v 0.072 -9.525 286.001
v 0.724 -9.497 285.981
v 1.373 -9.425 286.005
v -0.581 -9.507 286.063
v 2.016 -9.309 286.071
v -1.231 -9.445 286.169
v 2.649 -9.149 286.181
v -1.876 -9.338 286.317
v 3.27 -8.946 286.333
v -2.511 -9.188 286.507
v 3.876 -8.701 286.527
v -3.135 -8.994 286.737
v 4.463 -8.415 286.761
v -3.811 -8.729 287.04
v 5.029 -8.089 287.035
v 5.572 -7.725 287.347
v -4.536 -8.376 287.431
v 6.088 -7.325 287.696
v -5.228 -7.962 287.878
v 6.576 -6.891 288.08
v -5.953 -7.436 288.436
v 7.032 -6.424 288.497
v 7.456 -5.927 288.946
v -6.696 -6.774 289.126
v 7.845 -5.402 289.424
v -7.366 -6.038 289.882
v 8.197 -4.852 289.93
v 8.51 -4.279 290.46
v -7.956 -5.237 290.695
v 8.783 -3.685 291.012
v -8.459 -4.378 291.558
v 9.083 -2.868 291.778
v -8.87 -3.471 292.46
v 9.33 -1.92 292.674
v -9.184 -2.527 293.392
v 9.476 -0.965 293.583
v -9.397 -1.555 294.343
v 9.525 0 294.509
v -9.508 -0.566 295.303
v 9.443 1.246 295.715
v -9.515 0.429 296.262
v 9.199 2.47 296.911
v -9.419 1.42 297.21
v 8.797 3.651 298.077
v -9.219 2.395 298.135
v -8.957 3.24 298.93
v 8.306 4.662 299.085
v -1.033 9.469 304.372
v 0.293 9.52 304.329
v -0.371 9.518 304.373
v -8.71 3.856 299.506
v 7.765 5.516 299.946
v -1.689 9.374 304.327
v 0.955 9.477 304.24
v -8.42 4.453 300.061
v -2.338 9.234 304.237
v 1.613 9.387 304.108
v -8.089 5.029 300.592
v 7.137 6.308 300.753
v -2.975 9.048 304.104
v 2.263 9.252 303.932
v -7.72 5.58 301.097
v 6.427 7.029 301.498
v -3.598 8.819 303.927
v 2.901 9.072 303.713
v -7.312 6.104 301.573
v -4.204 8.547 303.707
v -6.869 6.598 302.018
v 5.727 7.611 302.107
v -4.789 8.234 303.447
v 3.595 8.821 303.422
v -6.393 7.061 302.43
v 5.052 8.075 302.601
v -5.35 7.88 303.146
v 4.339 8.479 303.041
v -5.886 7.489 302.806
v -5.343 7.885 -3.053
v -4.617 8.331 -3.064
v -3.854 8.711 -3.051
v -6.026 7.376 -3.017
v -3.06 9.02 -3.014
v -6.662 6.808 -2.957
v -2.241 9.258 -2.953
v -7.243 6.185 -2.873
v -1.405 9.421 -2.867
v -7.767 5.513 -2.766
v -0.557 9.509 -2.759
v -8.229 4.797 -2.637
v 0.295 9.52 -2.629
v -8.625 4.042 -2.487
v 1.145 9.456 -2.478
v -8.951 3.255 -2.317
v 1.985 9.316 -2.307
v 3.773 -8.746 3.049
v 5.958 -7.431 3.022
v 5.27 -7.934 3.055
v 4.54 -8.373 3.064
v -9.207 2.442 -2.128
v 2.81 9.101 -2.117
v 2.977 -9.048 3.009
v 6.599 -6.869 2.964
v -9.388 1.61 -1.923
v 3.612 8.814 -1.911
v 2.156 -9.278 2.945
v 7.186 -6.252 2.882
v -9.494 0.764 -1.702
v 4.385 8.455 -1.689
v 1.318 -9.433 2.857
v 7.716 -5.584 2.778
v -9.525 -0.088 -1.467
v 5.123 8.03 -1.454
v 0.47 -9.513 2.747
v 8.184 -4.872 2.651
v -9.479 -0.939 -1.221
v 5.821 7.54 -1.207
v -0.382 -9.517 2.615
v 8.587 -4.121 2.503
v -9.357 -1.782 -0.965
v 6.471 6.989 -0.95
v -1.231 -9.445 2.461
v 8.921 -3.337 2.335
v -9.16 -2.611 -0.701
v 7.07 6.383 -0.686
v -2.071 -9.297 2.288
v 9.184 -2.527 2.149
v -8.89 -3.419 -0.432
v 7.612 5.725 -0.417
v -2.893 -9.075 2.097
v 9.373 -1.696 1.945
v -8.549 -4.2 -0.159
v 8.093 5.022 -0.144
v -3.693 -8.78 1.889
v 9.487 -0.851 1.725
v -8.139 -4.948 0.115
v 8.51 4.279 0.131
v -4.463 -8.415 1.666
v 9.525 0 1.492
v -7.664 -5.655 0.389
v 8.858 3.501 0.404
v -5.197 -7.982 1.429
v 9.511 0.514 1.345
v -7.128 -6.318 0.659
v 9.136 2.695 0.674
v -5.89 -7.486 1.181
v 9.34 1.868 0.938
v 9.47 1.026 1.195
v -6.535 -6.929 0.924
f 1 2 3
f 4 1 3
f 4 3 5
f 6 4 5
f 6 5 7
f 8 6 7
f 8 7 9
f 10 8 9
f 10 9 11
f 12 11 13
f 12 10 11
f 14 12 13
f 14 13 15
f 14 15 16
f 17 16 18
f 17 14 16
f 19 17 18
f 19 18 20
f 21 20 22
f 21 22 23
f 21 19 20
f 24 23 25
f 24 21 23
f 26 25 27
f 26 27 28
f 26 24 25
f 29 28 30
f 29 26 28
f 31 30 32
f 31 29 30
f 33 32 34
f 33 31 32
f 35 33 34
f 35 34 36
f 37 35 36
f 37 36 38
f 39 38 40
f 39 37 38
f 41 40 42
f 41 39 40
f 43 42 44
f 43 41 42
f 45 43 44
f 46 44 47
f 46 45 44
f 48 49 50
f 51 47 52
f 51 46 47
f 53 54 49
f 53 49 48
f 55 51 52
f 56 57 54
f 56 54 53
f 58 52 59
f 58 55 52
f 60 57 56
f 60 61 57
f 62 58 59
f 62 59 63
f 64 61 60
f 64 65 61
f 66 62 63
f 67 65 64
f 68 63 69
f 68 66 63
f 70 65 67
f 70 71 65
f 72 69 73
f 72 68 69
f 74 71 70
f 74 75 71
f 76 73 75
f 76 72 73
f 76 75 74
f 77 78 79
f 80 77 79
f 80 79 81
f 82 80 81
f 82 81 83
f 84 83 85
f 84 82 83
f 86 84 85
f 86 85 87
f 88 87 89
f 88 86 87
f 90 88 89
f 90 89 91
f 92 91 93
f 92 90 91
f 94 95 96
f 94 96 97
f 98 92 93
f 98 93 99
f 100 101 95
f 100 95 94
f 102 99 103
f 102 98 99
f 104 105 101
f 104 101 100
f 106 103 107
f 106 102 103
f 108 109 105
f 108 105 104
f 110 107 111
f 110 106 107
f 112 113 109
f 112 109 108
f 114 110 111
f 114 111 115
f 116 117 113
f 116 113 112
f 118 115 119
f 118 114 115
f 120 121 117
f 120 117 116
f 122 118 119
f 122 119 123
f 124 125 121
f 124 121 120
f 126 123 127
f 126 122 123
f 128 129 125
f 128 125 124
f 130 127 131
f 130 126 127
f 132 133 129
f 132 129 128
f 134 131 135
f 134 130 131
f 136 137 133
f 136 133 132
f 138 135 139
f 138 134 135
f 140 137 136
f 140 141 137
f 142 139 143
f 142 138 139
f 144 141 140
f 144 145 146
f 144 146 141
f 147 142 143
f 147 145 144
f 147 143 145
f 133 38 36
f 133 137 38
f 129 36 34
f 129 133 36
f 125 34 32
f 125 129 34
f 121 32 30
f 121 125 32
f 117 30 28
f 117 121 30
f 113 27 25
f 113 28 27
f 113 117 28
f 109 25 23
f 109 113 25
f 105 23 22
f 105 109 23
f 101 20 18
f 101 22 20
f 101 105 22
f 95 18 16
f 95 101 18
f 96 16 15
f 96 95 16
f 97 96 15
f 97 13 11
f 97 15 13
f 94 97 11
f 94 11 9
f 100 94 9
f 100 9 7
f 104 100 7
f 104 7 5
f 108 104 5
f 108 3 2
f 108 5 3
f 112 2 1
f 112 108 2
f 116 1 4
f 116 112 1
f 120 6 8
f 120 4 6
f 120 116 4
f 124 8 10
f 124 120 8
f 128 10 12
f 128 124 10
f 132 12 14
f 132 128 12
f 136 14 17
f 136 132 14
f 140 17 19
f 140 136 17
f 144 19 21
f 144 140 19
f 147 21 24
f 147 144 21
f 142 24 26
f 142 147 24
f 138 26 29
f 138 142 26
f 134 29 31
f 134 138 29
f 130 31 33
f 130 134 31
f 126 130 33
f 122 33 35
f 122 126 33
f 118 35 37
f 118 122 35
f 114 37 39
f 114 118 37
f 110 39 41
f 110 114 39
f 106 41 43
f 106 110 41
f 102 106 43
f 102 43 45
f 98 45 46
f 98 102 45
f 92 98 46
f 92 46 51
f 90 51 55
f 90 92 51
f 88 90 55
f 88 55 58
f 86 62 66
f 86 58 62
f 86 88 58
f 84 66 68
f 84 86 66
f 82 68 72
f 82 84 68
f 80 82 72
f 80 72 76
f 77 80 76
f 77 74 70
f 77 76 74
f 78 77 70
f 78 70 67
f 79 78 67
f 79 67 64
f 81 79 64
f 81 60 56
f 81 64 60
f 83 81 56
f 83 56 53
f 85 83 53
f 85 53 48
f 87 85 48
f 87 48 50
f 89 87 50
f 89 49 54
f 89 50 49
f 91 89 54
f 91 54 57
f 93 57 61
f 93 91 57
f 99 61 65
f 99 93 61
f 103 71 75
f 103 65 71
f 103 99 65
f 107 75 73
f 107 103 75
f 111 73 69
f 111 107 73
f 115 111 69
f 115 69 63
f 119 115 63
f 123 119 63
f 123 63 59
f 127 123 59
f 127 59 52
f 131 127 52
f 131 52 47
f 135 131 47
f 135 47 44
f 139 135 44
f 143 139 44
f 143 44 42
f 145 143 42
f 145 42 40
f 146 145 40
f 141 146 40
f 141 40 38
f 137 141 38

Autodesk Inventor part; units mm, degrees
ref_plane "Start Plane" through (0, 0, -4.1685) normal (0, 0, 1) x (1, 0, 0)
ref_plane "End Plane" through (0, 0, 305.0239) normal (0, 0, 1) x (1, 0, 0)
sketch "Sketch" plane through (0, 0, 0) normal (0, 0, 1) x (1, 0, 0)
  circle A0 centre (0, 0) radius 9.525
  dimension "d0" = 19.05
extrude "Body" add sketch "Sketch" along normal up to surface (309.1925 mm away) from surface at -4.1685
sketch "Sketch2" plane through (0, 0, 0) normal (0, 0, 1) x (1, 0, 0)
  line L0 (0, 0) -> (10, 0)
ref_plane "Work Plane3" through (0, 0, 0) normal (0, -1, 0) x (1, 0, 0)
ref_plane "Work Plane4" through (-4.6367, 8.3203, -3.0644) normal (0.1491, -0.2675, -0.9519) x (0.5375, 0.83, -0.1491)
split "Split1" plane through (-4.6367, 8.3203, -3.0644) removes the side toward (0.1491, -0.2675, -0.9519)
ref_plane "Work Plane5" through (-0.6942, 9.4997, 304.378) normal (0.0506, -0.6928, 0.7193) x (0.9985, 0.0204, -0.0506)
split "Split2" plane through (-0.6942, 9.4997, 304.378) removes the side toward (0.0506, -0.6928, 0.7193)
sketch "Sketch3" plane through (0, 0, 0) normal (0, -1, 0) x (1, 0, 0)
  line L0 (-2, -4.1685) -> (12, -4.1685) projected
  line L1 (-2, 305.0239) -> (12, 305.0239) projected
  dimension "d7" = 309.1925
equation "\"d0\" = Diam"
equation "\"d1\" = G_L"
equation "\"Diam\" = 19.05"
equation "\"G_L\" = 307.4424"
equation "\"G_OFFSET_START\" = 4.16853"
equation "\"G_OFFSET_END\" = 9.84412"
equation "\"d4\" = -G_OFFSET_START"
equation "\"d5\" = G_OFFSET_END + B_L"
equation "\"B_L\" = 295.17982"
properties part number "ANSI/AISC Rolled Steel - 3/4-12.104, RB" material "Steel, Mild"
